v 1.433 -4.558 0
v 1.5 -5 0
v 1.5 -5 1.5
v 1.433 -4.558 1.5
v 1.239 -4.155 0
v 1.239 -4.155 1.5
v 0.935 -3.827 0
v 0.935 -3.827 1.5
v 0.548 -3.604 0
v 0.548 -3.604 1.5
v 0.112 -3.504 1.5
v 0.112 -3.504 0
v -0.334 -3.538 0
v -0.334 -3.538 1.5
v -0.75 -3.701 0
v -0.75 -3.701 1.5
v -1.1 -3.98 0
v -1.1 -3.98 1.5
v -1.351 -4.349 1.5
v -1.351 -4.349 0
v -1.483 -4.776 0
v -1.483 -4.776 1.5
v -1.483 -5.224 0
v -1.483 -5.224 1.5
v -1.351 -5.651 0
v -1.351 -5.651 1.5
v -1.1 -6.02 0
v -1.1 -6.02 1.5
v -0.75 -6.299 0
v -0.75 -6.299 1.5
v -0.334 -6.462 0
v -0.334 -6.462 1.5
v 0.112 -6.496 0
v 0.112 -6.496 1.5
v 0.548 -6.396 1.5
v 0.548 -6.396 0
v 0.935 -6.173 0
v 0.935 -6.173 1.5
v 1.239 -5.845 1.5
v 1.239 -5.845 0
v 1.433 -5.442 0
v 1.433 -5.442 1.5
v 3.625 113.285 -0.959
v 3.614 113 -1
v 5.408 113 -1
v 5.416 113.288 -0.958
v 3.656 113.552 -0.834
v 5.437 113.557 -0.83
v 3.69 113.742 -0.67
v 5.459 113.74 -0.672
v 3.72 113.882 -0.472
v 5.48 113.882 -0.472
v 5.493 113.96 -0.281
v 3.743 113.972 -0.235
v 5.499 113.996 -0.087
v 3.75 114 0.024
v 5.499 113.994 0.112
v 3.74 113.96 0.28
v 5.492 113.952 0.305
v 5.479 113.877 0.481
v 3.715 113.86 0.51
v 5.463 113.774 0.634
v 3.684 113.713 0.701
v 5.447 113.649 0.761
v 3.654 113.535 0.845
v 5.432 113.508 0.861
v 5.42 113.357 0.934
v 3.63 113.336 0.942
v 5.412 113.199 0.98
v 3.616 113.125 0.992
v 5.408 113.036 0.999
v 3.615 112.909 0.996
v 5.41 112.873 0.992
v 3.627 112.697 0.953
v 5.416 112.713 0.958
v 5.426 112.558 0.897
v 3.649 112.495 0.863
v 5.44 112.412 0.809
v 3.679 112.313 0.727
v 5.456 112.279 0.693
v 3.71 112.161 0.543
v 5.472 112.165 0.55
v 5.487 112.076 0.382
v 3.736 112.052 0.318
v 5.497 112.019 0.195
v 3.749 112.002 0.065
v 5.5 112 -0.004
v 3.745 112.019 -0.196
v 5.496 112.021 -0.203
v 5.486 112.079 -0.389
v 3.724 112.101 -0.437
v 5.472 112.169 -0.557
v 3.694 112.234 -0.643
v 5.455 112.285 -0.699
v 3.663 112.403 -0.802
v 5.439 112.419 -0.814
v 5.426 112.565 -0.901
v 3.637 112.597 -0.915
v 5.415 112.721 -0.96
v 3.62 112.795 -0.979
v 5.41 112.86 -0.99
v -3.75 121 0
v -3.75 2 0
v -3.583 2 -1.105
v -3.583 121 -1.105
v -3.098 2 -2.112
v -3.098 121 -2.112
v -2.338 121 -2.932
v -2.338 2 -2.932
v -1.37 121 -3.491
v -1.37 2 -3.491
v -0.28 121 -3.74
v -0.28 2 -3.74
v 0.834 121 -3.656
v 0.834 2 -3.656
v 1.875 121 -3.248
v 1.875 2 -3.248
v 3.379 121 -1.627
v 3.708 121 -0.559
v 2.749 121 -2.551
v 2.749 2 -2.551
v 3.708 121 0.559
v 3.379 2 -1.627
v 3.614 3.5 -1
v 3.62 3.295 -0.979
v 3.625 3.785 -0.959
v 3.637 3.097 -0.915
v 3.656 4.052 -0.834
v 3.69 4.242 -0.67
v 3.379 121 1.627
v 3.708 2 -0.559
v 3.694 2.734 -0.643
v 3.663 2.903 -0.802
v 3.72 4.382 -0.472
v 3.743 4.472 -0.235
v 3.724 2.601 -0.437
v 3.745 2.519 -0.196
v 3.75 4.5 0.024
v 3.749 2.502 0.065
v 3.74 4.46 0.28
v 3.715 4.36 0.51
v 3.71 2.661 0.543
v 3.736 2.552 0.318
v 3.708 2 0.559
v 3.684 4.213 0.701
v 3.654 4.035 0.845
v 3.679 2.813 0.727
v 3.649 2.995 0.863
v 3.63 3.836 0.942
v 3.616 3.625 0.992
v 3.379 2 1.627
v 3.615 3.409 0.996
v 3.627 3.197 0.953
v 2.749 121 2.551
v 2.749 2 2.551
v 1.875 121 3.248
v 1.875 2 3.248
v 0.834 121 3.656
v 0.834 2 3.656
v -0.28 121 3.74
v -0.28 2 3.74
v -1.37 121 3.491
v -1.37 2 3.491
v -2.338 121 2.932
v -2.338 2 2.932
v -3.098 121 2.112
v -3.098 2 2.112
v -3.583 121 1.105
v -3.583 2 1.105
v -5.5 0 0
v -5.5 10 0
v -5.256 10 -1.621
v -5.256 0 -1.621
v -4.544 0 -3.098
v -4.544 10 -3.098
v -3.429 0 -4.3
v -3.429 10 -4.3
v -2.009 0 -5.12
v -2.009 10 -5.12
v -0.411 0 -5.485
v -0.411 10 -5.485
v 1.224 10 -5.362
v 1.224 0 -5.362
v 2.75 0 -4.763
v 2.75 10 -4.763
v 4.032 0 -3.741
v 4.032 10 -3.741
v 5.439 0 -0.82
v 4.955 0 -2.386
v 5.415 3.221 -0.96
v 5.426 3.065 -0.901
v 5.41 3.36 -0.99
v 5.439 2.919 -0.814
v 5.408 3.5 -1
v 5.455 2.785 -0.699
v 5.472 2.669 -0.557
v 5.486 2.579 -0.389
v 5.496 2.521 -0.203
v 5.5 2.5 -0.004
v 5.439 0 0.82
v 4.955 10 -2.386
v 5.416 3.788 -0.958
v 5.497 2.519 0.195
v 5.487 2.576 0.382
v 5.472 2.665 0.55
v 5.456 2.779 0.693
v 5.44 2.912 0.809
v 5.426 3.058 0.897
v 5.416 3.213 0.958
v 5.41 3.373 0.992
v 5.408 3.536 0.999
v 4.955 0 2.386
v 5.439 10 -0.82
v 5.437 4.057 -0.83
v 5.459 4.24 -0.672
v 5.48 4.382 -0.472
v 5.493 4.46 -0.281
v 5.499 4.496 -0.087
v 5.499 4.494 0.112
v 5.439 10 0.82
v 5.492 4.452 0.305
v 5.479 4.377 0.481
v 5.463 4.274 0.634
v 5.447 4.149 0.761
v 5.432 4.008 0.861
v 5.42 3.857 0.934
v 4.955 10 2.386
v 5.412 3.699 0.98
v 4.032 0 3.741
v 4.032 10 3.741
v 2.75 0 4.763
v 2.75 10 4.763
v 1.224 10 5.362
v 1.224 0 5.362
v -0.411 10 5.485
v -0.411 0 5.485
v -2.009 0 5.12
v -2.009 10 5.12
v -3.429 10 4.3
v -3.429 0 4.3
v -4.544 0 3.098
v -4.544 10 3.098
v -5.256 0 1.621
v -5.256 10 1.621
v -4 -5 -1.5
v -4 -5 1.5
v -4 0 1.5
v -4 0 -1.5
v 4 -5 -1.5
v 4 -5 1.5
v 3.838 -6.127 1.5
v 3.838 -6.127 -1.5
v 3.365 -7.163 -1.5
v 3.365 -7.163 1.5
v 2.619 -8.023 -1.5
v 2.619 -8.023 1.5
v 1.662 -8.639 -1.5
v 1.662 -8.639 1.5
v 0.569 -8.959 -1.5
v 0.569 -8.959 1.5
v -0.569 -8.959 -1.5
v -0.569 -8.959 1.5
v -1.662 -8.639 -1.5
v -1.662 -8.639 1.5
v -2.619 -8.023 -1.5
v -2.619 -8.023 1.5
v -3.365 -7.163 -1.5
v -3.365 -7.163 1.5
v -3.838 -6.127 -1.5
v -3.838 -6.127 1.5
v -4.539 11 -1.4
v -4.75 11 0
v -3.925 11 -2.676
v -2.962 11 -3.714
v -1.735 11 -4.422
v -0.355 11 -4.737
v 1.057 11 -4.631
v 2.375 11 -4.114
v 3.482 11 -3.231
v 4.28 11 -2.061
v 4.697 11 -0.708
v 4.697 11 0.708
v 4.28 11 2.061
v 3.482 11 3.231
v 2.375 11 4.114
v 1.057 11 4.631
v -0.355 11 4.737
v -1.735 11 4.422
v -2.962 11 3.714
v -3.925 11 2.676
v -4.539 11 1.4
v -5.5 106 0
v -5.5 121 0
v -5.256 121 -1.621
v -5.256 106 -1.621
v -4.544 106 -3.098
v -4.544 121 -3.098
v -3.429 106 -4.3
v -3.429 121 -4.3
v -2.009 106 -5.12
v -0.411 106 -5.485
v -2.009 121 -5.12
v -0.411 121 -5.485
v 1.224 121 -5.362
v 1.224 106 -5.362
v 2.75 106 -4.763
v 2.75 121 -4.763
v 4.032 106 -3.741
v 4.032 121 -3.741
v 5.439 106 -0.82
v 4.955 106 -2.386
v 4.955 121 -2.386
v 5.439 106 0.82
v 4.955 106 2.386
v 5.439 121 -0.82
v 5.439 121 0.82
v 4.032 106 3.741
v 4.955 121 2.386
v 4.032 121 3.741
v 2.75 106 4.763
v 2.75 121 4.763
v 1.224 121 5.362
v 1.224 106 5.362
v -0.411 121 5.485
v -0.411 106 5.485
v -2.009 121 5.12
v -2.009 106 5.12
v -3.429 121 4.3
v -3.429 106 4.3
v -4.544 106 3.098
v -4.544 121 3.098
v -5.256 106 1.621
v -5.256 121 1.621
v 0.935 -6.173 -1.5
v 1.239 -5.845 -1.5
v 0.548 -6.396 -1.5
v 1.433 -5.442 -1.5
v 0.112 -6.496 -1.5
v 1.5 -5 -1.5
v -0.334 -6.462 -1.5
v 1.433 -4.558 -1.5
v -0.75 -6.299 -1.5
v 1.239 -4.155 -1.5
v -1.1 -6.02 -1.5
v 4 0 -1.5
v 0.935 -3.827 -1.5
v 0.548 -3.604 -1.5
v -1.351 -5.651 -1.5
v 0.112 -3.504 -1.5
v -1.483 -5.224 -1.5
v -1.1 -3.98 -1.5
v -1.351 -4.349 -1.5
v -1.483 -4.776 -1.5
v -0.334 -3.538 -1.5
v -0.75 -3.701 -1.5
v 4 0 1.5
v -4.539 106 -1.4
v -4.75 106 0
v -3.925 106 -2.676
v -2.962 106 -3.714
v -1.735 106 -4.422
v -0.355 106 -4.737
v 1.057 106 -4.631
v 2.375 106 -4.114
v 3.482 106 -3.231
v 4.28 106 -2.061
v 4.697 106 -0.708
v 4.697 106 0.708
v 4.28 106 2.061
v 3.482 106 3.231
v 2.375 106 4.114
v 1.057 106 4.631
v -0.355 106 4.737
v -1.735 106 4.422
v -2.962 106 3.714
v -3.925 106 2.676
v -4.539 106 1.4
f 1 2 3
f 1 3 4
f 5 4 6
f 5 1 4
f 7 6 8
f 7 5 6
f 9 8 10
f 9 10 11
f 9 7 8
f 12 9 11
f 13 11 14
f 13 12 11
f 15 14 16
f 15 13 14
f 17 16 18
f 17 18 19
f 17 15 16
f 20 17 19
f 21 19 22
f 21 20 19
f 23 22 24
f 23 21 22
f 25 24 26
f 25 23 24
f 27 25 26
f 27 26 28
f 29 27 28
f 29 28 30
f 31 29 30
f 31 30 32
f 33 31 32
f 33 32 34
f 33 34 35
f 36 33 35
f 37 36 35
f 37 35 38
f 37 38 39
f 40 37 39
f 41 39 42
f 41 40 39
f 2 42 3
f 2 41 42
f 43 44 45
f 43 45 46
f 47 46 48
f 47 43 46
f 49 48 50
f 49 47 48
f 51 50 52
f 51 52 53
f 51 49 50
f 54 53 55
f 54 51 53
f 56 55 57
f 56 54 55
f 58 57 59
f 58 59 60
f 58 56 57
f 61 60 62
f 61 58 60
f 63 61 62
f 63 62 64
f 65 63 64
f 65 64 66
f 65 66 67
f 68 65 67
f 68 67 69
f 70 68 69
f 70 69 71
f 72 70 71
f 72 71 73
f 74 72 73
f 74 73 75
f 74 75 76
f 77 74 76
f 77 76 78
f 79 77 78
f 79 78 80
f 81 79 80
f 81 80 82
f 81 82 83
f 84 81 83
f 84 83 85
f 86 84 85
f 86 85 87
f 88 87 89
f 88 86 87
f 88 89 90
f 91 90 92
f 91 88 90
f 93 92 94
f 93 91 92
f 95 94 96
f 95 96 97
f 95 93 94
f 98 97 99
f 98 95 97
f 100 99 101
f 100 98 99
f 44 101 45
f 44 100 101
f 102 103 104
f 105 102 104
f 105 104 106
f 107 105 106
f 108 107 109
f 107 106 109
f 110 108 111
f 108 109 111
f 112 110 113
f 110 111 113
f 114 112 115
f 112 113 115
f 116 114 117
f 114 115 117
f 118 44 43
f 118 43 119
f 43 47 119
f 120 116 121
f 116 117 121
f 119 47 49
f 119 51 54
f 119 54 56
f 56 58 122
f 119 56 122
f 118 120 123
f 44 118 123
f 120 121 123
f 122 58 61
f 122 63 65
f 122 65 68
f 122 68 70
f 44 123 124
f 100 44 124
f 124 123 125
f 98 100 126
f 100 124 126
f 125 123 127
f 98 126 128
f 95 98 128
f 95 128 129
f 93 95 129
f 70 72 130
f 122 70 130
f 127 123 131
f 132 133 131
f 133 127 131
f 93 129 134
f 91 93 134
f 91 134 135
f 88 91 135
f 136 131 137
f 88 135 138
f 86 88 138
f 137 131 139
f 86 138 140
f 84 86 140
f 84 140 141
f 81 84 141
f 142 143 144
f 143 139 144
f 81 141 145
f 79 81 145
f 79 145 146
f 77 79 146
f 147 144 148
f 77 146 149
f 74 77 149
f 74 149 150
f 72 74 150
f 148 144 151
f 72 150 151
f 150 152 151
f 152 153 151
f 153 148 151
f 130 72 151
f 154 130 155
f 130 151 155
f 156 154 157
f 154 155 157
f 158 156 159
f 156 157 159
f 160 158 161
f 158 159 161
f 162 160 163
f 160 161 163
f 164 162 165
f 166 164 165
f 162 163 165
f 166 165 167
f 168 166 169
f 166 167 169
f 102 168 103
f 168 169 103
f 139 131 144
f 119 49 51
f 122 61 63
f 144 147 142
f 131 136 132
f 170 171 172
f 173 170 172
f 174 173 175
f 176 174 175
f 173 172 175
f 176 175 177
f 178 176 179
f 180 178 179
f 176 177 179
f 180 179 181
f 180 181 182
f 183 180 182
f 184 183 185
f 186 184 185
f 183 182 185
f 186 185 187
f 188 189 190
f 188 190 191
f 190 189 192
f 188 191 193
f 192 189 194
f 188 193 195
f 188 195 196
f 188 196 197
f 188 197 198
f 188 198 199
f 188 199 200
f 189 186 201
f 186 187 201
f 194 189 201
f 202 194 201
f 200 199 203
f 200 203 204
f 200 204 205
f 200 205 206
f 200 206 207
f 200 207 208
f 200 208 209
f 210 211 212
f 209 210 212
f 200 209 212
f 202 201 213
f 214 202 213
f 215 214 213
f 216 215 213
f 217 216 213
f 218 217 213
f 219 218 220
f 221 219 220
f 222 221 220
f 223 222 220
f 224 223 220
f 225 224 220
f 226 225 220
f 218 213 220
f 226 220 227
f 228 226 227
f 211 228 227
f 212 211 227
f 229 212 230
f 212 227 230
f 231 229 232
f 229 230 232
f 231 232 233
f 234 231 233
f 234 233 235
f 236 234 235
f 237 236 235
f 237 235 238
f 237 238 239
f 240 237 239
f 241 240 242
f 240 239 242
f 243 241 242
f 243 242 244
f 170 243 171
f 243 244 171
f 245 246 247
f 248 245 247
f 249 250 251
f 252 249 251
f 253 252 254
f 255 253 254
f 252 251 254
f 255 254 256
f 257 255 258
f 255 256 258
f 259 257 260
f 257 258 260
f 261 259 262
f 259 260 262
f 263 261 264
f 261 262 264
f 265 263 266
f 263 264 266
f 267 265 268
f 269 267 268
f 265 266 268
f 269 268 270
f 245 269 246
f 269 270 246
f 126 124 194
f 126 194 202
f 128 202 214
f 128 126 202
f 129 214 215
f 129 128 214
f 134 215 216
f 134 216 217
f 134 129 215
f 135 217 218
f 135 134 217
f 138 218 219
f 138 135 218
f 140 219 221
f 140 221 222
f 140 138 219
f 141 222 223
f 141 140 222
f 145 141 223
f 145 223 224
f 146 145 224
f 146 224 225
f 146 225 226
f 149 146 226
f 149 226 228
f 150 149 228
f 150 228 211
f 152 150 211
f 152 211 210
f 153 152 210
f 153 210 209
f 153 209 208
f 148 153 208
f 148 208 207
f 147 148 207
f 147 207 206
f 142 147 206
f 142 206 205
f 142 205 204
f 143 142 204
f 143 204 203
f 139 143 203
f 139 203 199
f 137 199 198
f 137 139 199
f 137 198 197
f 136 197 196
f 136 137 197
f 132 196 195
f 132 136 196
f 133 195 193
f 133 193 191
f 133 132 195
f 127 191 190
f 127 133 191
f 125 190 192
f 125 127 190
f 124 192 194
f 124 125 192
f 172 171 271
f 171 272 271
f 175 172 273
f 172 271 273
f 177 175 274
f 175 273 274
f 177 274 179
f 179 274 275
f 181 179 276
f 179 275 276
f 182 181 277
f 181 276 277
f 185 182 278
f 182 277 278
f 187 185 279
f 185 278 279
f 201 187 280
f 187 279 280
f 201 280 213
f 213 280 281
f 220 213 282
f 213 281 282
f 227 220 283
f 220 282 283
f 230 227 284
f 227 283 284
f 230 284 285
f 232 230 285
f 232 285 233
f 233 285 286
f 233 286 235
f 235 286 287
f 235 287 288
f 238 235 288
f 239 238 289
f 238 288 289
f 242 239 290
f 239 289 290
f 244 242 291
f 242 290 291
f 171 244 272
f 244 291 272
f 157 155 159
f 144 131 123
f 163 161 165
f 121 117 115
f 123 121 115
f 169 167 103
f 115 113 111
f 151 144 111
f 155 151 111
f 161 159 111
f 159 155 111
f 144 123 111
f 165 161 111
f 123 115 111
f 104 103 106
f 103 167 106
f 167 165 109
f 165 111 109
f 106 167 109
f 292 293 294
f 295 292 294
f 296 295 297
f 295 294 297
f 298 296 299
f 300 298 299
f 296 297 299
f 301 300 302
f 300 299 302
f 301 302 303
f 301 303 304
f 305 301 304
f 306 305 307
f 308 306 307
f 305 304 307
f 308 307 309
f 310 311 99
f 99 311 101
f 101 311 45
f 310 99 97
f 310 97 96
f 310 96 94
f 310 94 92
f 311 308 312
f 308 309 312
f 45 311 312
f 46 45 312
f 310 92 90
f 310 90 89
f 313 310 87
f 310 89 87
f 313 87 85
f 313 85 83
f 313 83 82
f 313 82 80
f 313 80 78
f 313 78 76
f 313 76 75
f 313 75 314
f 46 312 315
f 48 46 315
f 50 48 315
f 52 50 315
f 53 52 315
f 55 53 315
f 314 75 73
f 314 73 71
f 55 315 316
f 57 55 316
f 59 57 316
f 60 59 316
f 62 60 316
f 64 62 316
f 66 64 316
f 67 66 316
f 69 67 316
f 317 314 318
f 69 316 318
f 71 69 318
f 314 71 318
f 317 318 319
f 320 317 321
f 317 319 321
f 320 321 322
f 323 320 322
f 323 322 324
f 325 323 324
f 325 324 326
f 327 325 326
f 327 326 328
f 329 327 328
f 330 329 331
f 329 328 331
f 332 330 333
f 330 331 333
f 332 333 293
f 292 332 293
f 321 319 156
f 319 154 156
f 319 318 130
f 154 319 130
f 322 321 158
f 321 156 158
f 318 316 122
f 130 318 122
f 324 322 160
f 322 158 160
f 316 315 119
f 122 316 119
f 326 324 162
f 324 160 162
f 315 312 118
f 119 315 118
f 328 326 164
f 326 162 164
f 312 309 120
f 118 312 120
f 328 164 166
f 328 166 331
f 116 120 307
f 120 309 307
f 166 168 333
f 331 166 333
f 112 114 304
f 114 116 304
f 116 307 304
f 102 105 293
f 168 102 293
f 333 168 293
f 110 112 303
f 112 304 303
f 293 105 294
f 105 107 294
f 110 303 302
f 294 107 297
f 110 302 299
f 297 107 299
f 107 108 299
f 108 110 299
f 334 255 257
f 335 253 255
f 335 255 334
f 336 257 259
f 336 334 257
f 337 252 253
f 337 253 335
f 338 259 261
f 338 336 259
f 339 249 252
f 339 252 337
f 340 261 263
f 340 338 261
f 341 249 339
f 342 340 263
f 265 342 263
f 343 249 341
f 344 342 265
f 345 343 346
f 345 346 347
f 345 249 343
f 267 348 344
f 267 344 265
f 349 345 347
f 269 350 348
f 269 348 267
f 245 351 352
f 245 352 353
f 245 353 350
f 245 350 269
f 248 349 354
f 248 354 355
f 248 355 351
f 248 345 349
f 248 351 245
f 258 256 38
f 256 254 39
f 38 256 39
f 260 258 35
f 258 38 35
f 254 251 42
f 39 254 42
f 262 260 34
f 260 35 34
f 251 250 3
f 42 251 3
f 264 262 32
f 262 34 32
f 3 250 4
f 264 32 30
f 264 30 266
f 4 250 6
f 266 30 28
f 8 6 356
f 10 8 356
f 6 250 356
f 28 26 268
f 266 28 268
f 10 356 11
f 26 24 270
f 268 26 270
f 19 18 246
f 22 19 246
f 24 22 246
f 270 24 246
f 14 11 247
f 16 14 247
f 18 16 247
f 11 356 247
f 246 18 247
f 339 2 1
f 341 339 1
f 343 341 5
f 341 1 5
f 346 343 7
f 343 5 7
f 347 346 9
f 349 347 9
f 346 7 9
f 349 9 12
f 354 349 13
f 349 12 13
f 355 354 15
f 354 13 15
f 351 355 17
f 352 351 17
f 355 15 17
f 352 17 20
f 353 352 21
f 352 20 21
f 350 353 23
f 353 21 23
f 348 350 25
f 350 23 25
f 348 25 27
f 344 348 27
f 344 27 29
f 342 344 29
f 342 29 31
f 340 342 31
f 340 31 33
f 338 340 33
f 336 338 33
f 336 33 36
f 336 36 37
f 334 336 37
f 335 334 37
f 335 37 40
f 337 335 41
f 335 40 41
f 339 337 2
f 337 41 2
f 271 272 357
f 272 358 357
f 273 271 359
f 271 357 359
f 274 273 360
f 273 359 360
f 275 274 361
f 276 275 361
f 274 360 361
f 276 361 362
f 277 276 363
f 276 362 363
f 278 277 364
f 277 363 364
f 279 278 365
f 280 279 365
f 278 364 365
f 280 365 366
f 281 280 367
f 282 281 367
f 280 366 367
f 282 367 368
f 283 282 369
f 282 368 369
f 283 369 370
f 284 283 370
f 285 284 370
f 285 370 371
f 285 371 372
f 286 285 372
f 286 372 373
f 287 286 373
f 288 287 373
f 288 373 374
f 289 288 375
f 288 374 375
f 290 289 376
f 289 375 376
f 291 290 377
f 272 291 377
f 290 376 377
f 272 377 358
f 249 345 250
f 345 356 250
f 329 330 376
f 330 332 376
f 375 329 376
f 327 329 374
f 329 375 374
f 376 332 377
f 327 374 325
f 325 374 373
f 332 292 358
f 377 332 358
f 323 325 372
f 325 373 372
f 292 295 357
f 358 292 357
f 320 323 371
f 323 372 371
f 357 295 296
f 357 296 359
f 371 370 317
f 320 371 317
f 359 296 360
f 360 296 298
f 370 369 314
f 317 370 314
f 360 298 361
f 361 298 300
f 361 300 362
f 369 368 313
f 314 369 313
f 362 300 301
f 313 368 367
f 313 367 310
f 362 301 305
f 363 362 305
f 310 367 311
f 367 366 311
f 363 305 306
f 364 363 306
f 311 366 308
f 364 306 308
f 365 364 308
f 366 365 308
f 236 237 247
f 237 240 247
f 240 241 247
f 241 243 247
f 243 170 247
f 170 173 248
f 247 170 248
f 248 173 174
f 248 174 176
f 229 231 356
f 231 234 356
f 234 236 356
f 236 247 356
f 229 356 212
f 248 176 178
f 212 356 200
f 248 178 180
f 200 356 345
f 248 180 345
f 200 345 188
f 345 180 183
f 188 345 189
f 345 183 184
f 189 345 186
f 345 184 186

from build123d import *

# Parameters (mm, degrees)
BOSS_EXTRUDE1_DEPTH      = 1.5
BOSS_EXTRUDE1_DEPTH_BACK = 1.5
SKETCH2_R                = 1.5
SKETCH3_R                = 1
CUT_EXTRUDE1_DEPTH       = 10


with BuildPart() as part:
    # Sketch1 → Revolve1 (revolve)
    with BuildSketch(Plane.XY):
        Polygon((0, 0), (-5.5, 0), (-5.5, 10), (-4.75, 11), (-4.75, 106), (-5.5, 106), (-5.5, 121), (-3.75, 121), (-3.75, 2), (0, 2), align=None)
    revolve(axis=Axis((0, 121, 0), (0, -1, 0)))

    # Sketch2 → Boss-Extrude1 (add, two sides: drawn at the far end of the back side and taken through both)
    with BuildSketch(Plane.XY.offset(-BOSS_EXTRUDE1_DEPTH_BACK)):
        with BuildLine():
            Line((-4, 0), (4, 0))
            Line((4, 0), (4, -5))
            ThreePointArc((4, -5), (0, -9), (-4, -5))
            Line((-4, -5), (-4, 0))
        make_face()
        with Locations((0, -5)):
            Circle(SKETCH2_R, mode=Mode.SUBTRACT)
    extrude(amount=BOSS_EXTRUDE1_DEPTH + BOSS_EXTRUDE1_DEPTH_BACK)

    # Sketch3 → Cut-Extrude1 (cut)
    with BuildSketch(Plane(origin=(0, 0, 0), x_dir=(0, 0, -1), z_dir=(1, 0, 0))):
        with Locations((0, 3.5)):
            Circle(SKETCH3_R)
        with Locations((0, 113)):
            Circle(SKETCH3_R)
    extrude(amount=CUT_EXTRUDE1_DEPTH, mode=Mode.SUBTRACT)


solid = part.part
